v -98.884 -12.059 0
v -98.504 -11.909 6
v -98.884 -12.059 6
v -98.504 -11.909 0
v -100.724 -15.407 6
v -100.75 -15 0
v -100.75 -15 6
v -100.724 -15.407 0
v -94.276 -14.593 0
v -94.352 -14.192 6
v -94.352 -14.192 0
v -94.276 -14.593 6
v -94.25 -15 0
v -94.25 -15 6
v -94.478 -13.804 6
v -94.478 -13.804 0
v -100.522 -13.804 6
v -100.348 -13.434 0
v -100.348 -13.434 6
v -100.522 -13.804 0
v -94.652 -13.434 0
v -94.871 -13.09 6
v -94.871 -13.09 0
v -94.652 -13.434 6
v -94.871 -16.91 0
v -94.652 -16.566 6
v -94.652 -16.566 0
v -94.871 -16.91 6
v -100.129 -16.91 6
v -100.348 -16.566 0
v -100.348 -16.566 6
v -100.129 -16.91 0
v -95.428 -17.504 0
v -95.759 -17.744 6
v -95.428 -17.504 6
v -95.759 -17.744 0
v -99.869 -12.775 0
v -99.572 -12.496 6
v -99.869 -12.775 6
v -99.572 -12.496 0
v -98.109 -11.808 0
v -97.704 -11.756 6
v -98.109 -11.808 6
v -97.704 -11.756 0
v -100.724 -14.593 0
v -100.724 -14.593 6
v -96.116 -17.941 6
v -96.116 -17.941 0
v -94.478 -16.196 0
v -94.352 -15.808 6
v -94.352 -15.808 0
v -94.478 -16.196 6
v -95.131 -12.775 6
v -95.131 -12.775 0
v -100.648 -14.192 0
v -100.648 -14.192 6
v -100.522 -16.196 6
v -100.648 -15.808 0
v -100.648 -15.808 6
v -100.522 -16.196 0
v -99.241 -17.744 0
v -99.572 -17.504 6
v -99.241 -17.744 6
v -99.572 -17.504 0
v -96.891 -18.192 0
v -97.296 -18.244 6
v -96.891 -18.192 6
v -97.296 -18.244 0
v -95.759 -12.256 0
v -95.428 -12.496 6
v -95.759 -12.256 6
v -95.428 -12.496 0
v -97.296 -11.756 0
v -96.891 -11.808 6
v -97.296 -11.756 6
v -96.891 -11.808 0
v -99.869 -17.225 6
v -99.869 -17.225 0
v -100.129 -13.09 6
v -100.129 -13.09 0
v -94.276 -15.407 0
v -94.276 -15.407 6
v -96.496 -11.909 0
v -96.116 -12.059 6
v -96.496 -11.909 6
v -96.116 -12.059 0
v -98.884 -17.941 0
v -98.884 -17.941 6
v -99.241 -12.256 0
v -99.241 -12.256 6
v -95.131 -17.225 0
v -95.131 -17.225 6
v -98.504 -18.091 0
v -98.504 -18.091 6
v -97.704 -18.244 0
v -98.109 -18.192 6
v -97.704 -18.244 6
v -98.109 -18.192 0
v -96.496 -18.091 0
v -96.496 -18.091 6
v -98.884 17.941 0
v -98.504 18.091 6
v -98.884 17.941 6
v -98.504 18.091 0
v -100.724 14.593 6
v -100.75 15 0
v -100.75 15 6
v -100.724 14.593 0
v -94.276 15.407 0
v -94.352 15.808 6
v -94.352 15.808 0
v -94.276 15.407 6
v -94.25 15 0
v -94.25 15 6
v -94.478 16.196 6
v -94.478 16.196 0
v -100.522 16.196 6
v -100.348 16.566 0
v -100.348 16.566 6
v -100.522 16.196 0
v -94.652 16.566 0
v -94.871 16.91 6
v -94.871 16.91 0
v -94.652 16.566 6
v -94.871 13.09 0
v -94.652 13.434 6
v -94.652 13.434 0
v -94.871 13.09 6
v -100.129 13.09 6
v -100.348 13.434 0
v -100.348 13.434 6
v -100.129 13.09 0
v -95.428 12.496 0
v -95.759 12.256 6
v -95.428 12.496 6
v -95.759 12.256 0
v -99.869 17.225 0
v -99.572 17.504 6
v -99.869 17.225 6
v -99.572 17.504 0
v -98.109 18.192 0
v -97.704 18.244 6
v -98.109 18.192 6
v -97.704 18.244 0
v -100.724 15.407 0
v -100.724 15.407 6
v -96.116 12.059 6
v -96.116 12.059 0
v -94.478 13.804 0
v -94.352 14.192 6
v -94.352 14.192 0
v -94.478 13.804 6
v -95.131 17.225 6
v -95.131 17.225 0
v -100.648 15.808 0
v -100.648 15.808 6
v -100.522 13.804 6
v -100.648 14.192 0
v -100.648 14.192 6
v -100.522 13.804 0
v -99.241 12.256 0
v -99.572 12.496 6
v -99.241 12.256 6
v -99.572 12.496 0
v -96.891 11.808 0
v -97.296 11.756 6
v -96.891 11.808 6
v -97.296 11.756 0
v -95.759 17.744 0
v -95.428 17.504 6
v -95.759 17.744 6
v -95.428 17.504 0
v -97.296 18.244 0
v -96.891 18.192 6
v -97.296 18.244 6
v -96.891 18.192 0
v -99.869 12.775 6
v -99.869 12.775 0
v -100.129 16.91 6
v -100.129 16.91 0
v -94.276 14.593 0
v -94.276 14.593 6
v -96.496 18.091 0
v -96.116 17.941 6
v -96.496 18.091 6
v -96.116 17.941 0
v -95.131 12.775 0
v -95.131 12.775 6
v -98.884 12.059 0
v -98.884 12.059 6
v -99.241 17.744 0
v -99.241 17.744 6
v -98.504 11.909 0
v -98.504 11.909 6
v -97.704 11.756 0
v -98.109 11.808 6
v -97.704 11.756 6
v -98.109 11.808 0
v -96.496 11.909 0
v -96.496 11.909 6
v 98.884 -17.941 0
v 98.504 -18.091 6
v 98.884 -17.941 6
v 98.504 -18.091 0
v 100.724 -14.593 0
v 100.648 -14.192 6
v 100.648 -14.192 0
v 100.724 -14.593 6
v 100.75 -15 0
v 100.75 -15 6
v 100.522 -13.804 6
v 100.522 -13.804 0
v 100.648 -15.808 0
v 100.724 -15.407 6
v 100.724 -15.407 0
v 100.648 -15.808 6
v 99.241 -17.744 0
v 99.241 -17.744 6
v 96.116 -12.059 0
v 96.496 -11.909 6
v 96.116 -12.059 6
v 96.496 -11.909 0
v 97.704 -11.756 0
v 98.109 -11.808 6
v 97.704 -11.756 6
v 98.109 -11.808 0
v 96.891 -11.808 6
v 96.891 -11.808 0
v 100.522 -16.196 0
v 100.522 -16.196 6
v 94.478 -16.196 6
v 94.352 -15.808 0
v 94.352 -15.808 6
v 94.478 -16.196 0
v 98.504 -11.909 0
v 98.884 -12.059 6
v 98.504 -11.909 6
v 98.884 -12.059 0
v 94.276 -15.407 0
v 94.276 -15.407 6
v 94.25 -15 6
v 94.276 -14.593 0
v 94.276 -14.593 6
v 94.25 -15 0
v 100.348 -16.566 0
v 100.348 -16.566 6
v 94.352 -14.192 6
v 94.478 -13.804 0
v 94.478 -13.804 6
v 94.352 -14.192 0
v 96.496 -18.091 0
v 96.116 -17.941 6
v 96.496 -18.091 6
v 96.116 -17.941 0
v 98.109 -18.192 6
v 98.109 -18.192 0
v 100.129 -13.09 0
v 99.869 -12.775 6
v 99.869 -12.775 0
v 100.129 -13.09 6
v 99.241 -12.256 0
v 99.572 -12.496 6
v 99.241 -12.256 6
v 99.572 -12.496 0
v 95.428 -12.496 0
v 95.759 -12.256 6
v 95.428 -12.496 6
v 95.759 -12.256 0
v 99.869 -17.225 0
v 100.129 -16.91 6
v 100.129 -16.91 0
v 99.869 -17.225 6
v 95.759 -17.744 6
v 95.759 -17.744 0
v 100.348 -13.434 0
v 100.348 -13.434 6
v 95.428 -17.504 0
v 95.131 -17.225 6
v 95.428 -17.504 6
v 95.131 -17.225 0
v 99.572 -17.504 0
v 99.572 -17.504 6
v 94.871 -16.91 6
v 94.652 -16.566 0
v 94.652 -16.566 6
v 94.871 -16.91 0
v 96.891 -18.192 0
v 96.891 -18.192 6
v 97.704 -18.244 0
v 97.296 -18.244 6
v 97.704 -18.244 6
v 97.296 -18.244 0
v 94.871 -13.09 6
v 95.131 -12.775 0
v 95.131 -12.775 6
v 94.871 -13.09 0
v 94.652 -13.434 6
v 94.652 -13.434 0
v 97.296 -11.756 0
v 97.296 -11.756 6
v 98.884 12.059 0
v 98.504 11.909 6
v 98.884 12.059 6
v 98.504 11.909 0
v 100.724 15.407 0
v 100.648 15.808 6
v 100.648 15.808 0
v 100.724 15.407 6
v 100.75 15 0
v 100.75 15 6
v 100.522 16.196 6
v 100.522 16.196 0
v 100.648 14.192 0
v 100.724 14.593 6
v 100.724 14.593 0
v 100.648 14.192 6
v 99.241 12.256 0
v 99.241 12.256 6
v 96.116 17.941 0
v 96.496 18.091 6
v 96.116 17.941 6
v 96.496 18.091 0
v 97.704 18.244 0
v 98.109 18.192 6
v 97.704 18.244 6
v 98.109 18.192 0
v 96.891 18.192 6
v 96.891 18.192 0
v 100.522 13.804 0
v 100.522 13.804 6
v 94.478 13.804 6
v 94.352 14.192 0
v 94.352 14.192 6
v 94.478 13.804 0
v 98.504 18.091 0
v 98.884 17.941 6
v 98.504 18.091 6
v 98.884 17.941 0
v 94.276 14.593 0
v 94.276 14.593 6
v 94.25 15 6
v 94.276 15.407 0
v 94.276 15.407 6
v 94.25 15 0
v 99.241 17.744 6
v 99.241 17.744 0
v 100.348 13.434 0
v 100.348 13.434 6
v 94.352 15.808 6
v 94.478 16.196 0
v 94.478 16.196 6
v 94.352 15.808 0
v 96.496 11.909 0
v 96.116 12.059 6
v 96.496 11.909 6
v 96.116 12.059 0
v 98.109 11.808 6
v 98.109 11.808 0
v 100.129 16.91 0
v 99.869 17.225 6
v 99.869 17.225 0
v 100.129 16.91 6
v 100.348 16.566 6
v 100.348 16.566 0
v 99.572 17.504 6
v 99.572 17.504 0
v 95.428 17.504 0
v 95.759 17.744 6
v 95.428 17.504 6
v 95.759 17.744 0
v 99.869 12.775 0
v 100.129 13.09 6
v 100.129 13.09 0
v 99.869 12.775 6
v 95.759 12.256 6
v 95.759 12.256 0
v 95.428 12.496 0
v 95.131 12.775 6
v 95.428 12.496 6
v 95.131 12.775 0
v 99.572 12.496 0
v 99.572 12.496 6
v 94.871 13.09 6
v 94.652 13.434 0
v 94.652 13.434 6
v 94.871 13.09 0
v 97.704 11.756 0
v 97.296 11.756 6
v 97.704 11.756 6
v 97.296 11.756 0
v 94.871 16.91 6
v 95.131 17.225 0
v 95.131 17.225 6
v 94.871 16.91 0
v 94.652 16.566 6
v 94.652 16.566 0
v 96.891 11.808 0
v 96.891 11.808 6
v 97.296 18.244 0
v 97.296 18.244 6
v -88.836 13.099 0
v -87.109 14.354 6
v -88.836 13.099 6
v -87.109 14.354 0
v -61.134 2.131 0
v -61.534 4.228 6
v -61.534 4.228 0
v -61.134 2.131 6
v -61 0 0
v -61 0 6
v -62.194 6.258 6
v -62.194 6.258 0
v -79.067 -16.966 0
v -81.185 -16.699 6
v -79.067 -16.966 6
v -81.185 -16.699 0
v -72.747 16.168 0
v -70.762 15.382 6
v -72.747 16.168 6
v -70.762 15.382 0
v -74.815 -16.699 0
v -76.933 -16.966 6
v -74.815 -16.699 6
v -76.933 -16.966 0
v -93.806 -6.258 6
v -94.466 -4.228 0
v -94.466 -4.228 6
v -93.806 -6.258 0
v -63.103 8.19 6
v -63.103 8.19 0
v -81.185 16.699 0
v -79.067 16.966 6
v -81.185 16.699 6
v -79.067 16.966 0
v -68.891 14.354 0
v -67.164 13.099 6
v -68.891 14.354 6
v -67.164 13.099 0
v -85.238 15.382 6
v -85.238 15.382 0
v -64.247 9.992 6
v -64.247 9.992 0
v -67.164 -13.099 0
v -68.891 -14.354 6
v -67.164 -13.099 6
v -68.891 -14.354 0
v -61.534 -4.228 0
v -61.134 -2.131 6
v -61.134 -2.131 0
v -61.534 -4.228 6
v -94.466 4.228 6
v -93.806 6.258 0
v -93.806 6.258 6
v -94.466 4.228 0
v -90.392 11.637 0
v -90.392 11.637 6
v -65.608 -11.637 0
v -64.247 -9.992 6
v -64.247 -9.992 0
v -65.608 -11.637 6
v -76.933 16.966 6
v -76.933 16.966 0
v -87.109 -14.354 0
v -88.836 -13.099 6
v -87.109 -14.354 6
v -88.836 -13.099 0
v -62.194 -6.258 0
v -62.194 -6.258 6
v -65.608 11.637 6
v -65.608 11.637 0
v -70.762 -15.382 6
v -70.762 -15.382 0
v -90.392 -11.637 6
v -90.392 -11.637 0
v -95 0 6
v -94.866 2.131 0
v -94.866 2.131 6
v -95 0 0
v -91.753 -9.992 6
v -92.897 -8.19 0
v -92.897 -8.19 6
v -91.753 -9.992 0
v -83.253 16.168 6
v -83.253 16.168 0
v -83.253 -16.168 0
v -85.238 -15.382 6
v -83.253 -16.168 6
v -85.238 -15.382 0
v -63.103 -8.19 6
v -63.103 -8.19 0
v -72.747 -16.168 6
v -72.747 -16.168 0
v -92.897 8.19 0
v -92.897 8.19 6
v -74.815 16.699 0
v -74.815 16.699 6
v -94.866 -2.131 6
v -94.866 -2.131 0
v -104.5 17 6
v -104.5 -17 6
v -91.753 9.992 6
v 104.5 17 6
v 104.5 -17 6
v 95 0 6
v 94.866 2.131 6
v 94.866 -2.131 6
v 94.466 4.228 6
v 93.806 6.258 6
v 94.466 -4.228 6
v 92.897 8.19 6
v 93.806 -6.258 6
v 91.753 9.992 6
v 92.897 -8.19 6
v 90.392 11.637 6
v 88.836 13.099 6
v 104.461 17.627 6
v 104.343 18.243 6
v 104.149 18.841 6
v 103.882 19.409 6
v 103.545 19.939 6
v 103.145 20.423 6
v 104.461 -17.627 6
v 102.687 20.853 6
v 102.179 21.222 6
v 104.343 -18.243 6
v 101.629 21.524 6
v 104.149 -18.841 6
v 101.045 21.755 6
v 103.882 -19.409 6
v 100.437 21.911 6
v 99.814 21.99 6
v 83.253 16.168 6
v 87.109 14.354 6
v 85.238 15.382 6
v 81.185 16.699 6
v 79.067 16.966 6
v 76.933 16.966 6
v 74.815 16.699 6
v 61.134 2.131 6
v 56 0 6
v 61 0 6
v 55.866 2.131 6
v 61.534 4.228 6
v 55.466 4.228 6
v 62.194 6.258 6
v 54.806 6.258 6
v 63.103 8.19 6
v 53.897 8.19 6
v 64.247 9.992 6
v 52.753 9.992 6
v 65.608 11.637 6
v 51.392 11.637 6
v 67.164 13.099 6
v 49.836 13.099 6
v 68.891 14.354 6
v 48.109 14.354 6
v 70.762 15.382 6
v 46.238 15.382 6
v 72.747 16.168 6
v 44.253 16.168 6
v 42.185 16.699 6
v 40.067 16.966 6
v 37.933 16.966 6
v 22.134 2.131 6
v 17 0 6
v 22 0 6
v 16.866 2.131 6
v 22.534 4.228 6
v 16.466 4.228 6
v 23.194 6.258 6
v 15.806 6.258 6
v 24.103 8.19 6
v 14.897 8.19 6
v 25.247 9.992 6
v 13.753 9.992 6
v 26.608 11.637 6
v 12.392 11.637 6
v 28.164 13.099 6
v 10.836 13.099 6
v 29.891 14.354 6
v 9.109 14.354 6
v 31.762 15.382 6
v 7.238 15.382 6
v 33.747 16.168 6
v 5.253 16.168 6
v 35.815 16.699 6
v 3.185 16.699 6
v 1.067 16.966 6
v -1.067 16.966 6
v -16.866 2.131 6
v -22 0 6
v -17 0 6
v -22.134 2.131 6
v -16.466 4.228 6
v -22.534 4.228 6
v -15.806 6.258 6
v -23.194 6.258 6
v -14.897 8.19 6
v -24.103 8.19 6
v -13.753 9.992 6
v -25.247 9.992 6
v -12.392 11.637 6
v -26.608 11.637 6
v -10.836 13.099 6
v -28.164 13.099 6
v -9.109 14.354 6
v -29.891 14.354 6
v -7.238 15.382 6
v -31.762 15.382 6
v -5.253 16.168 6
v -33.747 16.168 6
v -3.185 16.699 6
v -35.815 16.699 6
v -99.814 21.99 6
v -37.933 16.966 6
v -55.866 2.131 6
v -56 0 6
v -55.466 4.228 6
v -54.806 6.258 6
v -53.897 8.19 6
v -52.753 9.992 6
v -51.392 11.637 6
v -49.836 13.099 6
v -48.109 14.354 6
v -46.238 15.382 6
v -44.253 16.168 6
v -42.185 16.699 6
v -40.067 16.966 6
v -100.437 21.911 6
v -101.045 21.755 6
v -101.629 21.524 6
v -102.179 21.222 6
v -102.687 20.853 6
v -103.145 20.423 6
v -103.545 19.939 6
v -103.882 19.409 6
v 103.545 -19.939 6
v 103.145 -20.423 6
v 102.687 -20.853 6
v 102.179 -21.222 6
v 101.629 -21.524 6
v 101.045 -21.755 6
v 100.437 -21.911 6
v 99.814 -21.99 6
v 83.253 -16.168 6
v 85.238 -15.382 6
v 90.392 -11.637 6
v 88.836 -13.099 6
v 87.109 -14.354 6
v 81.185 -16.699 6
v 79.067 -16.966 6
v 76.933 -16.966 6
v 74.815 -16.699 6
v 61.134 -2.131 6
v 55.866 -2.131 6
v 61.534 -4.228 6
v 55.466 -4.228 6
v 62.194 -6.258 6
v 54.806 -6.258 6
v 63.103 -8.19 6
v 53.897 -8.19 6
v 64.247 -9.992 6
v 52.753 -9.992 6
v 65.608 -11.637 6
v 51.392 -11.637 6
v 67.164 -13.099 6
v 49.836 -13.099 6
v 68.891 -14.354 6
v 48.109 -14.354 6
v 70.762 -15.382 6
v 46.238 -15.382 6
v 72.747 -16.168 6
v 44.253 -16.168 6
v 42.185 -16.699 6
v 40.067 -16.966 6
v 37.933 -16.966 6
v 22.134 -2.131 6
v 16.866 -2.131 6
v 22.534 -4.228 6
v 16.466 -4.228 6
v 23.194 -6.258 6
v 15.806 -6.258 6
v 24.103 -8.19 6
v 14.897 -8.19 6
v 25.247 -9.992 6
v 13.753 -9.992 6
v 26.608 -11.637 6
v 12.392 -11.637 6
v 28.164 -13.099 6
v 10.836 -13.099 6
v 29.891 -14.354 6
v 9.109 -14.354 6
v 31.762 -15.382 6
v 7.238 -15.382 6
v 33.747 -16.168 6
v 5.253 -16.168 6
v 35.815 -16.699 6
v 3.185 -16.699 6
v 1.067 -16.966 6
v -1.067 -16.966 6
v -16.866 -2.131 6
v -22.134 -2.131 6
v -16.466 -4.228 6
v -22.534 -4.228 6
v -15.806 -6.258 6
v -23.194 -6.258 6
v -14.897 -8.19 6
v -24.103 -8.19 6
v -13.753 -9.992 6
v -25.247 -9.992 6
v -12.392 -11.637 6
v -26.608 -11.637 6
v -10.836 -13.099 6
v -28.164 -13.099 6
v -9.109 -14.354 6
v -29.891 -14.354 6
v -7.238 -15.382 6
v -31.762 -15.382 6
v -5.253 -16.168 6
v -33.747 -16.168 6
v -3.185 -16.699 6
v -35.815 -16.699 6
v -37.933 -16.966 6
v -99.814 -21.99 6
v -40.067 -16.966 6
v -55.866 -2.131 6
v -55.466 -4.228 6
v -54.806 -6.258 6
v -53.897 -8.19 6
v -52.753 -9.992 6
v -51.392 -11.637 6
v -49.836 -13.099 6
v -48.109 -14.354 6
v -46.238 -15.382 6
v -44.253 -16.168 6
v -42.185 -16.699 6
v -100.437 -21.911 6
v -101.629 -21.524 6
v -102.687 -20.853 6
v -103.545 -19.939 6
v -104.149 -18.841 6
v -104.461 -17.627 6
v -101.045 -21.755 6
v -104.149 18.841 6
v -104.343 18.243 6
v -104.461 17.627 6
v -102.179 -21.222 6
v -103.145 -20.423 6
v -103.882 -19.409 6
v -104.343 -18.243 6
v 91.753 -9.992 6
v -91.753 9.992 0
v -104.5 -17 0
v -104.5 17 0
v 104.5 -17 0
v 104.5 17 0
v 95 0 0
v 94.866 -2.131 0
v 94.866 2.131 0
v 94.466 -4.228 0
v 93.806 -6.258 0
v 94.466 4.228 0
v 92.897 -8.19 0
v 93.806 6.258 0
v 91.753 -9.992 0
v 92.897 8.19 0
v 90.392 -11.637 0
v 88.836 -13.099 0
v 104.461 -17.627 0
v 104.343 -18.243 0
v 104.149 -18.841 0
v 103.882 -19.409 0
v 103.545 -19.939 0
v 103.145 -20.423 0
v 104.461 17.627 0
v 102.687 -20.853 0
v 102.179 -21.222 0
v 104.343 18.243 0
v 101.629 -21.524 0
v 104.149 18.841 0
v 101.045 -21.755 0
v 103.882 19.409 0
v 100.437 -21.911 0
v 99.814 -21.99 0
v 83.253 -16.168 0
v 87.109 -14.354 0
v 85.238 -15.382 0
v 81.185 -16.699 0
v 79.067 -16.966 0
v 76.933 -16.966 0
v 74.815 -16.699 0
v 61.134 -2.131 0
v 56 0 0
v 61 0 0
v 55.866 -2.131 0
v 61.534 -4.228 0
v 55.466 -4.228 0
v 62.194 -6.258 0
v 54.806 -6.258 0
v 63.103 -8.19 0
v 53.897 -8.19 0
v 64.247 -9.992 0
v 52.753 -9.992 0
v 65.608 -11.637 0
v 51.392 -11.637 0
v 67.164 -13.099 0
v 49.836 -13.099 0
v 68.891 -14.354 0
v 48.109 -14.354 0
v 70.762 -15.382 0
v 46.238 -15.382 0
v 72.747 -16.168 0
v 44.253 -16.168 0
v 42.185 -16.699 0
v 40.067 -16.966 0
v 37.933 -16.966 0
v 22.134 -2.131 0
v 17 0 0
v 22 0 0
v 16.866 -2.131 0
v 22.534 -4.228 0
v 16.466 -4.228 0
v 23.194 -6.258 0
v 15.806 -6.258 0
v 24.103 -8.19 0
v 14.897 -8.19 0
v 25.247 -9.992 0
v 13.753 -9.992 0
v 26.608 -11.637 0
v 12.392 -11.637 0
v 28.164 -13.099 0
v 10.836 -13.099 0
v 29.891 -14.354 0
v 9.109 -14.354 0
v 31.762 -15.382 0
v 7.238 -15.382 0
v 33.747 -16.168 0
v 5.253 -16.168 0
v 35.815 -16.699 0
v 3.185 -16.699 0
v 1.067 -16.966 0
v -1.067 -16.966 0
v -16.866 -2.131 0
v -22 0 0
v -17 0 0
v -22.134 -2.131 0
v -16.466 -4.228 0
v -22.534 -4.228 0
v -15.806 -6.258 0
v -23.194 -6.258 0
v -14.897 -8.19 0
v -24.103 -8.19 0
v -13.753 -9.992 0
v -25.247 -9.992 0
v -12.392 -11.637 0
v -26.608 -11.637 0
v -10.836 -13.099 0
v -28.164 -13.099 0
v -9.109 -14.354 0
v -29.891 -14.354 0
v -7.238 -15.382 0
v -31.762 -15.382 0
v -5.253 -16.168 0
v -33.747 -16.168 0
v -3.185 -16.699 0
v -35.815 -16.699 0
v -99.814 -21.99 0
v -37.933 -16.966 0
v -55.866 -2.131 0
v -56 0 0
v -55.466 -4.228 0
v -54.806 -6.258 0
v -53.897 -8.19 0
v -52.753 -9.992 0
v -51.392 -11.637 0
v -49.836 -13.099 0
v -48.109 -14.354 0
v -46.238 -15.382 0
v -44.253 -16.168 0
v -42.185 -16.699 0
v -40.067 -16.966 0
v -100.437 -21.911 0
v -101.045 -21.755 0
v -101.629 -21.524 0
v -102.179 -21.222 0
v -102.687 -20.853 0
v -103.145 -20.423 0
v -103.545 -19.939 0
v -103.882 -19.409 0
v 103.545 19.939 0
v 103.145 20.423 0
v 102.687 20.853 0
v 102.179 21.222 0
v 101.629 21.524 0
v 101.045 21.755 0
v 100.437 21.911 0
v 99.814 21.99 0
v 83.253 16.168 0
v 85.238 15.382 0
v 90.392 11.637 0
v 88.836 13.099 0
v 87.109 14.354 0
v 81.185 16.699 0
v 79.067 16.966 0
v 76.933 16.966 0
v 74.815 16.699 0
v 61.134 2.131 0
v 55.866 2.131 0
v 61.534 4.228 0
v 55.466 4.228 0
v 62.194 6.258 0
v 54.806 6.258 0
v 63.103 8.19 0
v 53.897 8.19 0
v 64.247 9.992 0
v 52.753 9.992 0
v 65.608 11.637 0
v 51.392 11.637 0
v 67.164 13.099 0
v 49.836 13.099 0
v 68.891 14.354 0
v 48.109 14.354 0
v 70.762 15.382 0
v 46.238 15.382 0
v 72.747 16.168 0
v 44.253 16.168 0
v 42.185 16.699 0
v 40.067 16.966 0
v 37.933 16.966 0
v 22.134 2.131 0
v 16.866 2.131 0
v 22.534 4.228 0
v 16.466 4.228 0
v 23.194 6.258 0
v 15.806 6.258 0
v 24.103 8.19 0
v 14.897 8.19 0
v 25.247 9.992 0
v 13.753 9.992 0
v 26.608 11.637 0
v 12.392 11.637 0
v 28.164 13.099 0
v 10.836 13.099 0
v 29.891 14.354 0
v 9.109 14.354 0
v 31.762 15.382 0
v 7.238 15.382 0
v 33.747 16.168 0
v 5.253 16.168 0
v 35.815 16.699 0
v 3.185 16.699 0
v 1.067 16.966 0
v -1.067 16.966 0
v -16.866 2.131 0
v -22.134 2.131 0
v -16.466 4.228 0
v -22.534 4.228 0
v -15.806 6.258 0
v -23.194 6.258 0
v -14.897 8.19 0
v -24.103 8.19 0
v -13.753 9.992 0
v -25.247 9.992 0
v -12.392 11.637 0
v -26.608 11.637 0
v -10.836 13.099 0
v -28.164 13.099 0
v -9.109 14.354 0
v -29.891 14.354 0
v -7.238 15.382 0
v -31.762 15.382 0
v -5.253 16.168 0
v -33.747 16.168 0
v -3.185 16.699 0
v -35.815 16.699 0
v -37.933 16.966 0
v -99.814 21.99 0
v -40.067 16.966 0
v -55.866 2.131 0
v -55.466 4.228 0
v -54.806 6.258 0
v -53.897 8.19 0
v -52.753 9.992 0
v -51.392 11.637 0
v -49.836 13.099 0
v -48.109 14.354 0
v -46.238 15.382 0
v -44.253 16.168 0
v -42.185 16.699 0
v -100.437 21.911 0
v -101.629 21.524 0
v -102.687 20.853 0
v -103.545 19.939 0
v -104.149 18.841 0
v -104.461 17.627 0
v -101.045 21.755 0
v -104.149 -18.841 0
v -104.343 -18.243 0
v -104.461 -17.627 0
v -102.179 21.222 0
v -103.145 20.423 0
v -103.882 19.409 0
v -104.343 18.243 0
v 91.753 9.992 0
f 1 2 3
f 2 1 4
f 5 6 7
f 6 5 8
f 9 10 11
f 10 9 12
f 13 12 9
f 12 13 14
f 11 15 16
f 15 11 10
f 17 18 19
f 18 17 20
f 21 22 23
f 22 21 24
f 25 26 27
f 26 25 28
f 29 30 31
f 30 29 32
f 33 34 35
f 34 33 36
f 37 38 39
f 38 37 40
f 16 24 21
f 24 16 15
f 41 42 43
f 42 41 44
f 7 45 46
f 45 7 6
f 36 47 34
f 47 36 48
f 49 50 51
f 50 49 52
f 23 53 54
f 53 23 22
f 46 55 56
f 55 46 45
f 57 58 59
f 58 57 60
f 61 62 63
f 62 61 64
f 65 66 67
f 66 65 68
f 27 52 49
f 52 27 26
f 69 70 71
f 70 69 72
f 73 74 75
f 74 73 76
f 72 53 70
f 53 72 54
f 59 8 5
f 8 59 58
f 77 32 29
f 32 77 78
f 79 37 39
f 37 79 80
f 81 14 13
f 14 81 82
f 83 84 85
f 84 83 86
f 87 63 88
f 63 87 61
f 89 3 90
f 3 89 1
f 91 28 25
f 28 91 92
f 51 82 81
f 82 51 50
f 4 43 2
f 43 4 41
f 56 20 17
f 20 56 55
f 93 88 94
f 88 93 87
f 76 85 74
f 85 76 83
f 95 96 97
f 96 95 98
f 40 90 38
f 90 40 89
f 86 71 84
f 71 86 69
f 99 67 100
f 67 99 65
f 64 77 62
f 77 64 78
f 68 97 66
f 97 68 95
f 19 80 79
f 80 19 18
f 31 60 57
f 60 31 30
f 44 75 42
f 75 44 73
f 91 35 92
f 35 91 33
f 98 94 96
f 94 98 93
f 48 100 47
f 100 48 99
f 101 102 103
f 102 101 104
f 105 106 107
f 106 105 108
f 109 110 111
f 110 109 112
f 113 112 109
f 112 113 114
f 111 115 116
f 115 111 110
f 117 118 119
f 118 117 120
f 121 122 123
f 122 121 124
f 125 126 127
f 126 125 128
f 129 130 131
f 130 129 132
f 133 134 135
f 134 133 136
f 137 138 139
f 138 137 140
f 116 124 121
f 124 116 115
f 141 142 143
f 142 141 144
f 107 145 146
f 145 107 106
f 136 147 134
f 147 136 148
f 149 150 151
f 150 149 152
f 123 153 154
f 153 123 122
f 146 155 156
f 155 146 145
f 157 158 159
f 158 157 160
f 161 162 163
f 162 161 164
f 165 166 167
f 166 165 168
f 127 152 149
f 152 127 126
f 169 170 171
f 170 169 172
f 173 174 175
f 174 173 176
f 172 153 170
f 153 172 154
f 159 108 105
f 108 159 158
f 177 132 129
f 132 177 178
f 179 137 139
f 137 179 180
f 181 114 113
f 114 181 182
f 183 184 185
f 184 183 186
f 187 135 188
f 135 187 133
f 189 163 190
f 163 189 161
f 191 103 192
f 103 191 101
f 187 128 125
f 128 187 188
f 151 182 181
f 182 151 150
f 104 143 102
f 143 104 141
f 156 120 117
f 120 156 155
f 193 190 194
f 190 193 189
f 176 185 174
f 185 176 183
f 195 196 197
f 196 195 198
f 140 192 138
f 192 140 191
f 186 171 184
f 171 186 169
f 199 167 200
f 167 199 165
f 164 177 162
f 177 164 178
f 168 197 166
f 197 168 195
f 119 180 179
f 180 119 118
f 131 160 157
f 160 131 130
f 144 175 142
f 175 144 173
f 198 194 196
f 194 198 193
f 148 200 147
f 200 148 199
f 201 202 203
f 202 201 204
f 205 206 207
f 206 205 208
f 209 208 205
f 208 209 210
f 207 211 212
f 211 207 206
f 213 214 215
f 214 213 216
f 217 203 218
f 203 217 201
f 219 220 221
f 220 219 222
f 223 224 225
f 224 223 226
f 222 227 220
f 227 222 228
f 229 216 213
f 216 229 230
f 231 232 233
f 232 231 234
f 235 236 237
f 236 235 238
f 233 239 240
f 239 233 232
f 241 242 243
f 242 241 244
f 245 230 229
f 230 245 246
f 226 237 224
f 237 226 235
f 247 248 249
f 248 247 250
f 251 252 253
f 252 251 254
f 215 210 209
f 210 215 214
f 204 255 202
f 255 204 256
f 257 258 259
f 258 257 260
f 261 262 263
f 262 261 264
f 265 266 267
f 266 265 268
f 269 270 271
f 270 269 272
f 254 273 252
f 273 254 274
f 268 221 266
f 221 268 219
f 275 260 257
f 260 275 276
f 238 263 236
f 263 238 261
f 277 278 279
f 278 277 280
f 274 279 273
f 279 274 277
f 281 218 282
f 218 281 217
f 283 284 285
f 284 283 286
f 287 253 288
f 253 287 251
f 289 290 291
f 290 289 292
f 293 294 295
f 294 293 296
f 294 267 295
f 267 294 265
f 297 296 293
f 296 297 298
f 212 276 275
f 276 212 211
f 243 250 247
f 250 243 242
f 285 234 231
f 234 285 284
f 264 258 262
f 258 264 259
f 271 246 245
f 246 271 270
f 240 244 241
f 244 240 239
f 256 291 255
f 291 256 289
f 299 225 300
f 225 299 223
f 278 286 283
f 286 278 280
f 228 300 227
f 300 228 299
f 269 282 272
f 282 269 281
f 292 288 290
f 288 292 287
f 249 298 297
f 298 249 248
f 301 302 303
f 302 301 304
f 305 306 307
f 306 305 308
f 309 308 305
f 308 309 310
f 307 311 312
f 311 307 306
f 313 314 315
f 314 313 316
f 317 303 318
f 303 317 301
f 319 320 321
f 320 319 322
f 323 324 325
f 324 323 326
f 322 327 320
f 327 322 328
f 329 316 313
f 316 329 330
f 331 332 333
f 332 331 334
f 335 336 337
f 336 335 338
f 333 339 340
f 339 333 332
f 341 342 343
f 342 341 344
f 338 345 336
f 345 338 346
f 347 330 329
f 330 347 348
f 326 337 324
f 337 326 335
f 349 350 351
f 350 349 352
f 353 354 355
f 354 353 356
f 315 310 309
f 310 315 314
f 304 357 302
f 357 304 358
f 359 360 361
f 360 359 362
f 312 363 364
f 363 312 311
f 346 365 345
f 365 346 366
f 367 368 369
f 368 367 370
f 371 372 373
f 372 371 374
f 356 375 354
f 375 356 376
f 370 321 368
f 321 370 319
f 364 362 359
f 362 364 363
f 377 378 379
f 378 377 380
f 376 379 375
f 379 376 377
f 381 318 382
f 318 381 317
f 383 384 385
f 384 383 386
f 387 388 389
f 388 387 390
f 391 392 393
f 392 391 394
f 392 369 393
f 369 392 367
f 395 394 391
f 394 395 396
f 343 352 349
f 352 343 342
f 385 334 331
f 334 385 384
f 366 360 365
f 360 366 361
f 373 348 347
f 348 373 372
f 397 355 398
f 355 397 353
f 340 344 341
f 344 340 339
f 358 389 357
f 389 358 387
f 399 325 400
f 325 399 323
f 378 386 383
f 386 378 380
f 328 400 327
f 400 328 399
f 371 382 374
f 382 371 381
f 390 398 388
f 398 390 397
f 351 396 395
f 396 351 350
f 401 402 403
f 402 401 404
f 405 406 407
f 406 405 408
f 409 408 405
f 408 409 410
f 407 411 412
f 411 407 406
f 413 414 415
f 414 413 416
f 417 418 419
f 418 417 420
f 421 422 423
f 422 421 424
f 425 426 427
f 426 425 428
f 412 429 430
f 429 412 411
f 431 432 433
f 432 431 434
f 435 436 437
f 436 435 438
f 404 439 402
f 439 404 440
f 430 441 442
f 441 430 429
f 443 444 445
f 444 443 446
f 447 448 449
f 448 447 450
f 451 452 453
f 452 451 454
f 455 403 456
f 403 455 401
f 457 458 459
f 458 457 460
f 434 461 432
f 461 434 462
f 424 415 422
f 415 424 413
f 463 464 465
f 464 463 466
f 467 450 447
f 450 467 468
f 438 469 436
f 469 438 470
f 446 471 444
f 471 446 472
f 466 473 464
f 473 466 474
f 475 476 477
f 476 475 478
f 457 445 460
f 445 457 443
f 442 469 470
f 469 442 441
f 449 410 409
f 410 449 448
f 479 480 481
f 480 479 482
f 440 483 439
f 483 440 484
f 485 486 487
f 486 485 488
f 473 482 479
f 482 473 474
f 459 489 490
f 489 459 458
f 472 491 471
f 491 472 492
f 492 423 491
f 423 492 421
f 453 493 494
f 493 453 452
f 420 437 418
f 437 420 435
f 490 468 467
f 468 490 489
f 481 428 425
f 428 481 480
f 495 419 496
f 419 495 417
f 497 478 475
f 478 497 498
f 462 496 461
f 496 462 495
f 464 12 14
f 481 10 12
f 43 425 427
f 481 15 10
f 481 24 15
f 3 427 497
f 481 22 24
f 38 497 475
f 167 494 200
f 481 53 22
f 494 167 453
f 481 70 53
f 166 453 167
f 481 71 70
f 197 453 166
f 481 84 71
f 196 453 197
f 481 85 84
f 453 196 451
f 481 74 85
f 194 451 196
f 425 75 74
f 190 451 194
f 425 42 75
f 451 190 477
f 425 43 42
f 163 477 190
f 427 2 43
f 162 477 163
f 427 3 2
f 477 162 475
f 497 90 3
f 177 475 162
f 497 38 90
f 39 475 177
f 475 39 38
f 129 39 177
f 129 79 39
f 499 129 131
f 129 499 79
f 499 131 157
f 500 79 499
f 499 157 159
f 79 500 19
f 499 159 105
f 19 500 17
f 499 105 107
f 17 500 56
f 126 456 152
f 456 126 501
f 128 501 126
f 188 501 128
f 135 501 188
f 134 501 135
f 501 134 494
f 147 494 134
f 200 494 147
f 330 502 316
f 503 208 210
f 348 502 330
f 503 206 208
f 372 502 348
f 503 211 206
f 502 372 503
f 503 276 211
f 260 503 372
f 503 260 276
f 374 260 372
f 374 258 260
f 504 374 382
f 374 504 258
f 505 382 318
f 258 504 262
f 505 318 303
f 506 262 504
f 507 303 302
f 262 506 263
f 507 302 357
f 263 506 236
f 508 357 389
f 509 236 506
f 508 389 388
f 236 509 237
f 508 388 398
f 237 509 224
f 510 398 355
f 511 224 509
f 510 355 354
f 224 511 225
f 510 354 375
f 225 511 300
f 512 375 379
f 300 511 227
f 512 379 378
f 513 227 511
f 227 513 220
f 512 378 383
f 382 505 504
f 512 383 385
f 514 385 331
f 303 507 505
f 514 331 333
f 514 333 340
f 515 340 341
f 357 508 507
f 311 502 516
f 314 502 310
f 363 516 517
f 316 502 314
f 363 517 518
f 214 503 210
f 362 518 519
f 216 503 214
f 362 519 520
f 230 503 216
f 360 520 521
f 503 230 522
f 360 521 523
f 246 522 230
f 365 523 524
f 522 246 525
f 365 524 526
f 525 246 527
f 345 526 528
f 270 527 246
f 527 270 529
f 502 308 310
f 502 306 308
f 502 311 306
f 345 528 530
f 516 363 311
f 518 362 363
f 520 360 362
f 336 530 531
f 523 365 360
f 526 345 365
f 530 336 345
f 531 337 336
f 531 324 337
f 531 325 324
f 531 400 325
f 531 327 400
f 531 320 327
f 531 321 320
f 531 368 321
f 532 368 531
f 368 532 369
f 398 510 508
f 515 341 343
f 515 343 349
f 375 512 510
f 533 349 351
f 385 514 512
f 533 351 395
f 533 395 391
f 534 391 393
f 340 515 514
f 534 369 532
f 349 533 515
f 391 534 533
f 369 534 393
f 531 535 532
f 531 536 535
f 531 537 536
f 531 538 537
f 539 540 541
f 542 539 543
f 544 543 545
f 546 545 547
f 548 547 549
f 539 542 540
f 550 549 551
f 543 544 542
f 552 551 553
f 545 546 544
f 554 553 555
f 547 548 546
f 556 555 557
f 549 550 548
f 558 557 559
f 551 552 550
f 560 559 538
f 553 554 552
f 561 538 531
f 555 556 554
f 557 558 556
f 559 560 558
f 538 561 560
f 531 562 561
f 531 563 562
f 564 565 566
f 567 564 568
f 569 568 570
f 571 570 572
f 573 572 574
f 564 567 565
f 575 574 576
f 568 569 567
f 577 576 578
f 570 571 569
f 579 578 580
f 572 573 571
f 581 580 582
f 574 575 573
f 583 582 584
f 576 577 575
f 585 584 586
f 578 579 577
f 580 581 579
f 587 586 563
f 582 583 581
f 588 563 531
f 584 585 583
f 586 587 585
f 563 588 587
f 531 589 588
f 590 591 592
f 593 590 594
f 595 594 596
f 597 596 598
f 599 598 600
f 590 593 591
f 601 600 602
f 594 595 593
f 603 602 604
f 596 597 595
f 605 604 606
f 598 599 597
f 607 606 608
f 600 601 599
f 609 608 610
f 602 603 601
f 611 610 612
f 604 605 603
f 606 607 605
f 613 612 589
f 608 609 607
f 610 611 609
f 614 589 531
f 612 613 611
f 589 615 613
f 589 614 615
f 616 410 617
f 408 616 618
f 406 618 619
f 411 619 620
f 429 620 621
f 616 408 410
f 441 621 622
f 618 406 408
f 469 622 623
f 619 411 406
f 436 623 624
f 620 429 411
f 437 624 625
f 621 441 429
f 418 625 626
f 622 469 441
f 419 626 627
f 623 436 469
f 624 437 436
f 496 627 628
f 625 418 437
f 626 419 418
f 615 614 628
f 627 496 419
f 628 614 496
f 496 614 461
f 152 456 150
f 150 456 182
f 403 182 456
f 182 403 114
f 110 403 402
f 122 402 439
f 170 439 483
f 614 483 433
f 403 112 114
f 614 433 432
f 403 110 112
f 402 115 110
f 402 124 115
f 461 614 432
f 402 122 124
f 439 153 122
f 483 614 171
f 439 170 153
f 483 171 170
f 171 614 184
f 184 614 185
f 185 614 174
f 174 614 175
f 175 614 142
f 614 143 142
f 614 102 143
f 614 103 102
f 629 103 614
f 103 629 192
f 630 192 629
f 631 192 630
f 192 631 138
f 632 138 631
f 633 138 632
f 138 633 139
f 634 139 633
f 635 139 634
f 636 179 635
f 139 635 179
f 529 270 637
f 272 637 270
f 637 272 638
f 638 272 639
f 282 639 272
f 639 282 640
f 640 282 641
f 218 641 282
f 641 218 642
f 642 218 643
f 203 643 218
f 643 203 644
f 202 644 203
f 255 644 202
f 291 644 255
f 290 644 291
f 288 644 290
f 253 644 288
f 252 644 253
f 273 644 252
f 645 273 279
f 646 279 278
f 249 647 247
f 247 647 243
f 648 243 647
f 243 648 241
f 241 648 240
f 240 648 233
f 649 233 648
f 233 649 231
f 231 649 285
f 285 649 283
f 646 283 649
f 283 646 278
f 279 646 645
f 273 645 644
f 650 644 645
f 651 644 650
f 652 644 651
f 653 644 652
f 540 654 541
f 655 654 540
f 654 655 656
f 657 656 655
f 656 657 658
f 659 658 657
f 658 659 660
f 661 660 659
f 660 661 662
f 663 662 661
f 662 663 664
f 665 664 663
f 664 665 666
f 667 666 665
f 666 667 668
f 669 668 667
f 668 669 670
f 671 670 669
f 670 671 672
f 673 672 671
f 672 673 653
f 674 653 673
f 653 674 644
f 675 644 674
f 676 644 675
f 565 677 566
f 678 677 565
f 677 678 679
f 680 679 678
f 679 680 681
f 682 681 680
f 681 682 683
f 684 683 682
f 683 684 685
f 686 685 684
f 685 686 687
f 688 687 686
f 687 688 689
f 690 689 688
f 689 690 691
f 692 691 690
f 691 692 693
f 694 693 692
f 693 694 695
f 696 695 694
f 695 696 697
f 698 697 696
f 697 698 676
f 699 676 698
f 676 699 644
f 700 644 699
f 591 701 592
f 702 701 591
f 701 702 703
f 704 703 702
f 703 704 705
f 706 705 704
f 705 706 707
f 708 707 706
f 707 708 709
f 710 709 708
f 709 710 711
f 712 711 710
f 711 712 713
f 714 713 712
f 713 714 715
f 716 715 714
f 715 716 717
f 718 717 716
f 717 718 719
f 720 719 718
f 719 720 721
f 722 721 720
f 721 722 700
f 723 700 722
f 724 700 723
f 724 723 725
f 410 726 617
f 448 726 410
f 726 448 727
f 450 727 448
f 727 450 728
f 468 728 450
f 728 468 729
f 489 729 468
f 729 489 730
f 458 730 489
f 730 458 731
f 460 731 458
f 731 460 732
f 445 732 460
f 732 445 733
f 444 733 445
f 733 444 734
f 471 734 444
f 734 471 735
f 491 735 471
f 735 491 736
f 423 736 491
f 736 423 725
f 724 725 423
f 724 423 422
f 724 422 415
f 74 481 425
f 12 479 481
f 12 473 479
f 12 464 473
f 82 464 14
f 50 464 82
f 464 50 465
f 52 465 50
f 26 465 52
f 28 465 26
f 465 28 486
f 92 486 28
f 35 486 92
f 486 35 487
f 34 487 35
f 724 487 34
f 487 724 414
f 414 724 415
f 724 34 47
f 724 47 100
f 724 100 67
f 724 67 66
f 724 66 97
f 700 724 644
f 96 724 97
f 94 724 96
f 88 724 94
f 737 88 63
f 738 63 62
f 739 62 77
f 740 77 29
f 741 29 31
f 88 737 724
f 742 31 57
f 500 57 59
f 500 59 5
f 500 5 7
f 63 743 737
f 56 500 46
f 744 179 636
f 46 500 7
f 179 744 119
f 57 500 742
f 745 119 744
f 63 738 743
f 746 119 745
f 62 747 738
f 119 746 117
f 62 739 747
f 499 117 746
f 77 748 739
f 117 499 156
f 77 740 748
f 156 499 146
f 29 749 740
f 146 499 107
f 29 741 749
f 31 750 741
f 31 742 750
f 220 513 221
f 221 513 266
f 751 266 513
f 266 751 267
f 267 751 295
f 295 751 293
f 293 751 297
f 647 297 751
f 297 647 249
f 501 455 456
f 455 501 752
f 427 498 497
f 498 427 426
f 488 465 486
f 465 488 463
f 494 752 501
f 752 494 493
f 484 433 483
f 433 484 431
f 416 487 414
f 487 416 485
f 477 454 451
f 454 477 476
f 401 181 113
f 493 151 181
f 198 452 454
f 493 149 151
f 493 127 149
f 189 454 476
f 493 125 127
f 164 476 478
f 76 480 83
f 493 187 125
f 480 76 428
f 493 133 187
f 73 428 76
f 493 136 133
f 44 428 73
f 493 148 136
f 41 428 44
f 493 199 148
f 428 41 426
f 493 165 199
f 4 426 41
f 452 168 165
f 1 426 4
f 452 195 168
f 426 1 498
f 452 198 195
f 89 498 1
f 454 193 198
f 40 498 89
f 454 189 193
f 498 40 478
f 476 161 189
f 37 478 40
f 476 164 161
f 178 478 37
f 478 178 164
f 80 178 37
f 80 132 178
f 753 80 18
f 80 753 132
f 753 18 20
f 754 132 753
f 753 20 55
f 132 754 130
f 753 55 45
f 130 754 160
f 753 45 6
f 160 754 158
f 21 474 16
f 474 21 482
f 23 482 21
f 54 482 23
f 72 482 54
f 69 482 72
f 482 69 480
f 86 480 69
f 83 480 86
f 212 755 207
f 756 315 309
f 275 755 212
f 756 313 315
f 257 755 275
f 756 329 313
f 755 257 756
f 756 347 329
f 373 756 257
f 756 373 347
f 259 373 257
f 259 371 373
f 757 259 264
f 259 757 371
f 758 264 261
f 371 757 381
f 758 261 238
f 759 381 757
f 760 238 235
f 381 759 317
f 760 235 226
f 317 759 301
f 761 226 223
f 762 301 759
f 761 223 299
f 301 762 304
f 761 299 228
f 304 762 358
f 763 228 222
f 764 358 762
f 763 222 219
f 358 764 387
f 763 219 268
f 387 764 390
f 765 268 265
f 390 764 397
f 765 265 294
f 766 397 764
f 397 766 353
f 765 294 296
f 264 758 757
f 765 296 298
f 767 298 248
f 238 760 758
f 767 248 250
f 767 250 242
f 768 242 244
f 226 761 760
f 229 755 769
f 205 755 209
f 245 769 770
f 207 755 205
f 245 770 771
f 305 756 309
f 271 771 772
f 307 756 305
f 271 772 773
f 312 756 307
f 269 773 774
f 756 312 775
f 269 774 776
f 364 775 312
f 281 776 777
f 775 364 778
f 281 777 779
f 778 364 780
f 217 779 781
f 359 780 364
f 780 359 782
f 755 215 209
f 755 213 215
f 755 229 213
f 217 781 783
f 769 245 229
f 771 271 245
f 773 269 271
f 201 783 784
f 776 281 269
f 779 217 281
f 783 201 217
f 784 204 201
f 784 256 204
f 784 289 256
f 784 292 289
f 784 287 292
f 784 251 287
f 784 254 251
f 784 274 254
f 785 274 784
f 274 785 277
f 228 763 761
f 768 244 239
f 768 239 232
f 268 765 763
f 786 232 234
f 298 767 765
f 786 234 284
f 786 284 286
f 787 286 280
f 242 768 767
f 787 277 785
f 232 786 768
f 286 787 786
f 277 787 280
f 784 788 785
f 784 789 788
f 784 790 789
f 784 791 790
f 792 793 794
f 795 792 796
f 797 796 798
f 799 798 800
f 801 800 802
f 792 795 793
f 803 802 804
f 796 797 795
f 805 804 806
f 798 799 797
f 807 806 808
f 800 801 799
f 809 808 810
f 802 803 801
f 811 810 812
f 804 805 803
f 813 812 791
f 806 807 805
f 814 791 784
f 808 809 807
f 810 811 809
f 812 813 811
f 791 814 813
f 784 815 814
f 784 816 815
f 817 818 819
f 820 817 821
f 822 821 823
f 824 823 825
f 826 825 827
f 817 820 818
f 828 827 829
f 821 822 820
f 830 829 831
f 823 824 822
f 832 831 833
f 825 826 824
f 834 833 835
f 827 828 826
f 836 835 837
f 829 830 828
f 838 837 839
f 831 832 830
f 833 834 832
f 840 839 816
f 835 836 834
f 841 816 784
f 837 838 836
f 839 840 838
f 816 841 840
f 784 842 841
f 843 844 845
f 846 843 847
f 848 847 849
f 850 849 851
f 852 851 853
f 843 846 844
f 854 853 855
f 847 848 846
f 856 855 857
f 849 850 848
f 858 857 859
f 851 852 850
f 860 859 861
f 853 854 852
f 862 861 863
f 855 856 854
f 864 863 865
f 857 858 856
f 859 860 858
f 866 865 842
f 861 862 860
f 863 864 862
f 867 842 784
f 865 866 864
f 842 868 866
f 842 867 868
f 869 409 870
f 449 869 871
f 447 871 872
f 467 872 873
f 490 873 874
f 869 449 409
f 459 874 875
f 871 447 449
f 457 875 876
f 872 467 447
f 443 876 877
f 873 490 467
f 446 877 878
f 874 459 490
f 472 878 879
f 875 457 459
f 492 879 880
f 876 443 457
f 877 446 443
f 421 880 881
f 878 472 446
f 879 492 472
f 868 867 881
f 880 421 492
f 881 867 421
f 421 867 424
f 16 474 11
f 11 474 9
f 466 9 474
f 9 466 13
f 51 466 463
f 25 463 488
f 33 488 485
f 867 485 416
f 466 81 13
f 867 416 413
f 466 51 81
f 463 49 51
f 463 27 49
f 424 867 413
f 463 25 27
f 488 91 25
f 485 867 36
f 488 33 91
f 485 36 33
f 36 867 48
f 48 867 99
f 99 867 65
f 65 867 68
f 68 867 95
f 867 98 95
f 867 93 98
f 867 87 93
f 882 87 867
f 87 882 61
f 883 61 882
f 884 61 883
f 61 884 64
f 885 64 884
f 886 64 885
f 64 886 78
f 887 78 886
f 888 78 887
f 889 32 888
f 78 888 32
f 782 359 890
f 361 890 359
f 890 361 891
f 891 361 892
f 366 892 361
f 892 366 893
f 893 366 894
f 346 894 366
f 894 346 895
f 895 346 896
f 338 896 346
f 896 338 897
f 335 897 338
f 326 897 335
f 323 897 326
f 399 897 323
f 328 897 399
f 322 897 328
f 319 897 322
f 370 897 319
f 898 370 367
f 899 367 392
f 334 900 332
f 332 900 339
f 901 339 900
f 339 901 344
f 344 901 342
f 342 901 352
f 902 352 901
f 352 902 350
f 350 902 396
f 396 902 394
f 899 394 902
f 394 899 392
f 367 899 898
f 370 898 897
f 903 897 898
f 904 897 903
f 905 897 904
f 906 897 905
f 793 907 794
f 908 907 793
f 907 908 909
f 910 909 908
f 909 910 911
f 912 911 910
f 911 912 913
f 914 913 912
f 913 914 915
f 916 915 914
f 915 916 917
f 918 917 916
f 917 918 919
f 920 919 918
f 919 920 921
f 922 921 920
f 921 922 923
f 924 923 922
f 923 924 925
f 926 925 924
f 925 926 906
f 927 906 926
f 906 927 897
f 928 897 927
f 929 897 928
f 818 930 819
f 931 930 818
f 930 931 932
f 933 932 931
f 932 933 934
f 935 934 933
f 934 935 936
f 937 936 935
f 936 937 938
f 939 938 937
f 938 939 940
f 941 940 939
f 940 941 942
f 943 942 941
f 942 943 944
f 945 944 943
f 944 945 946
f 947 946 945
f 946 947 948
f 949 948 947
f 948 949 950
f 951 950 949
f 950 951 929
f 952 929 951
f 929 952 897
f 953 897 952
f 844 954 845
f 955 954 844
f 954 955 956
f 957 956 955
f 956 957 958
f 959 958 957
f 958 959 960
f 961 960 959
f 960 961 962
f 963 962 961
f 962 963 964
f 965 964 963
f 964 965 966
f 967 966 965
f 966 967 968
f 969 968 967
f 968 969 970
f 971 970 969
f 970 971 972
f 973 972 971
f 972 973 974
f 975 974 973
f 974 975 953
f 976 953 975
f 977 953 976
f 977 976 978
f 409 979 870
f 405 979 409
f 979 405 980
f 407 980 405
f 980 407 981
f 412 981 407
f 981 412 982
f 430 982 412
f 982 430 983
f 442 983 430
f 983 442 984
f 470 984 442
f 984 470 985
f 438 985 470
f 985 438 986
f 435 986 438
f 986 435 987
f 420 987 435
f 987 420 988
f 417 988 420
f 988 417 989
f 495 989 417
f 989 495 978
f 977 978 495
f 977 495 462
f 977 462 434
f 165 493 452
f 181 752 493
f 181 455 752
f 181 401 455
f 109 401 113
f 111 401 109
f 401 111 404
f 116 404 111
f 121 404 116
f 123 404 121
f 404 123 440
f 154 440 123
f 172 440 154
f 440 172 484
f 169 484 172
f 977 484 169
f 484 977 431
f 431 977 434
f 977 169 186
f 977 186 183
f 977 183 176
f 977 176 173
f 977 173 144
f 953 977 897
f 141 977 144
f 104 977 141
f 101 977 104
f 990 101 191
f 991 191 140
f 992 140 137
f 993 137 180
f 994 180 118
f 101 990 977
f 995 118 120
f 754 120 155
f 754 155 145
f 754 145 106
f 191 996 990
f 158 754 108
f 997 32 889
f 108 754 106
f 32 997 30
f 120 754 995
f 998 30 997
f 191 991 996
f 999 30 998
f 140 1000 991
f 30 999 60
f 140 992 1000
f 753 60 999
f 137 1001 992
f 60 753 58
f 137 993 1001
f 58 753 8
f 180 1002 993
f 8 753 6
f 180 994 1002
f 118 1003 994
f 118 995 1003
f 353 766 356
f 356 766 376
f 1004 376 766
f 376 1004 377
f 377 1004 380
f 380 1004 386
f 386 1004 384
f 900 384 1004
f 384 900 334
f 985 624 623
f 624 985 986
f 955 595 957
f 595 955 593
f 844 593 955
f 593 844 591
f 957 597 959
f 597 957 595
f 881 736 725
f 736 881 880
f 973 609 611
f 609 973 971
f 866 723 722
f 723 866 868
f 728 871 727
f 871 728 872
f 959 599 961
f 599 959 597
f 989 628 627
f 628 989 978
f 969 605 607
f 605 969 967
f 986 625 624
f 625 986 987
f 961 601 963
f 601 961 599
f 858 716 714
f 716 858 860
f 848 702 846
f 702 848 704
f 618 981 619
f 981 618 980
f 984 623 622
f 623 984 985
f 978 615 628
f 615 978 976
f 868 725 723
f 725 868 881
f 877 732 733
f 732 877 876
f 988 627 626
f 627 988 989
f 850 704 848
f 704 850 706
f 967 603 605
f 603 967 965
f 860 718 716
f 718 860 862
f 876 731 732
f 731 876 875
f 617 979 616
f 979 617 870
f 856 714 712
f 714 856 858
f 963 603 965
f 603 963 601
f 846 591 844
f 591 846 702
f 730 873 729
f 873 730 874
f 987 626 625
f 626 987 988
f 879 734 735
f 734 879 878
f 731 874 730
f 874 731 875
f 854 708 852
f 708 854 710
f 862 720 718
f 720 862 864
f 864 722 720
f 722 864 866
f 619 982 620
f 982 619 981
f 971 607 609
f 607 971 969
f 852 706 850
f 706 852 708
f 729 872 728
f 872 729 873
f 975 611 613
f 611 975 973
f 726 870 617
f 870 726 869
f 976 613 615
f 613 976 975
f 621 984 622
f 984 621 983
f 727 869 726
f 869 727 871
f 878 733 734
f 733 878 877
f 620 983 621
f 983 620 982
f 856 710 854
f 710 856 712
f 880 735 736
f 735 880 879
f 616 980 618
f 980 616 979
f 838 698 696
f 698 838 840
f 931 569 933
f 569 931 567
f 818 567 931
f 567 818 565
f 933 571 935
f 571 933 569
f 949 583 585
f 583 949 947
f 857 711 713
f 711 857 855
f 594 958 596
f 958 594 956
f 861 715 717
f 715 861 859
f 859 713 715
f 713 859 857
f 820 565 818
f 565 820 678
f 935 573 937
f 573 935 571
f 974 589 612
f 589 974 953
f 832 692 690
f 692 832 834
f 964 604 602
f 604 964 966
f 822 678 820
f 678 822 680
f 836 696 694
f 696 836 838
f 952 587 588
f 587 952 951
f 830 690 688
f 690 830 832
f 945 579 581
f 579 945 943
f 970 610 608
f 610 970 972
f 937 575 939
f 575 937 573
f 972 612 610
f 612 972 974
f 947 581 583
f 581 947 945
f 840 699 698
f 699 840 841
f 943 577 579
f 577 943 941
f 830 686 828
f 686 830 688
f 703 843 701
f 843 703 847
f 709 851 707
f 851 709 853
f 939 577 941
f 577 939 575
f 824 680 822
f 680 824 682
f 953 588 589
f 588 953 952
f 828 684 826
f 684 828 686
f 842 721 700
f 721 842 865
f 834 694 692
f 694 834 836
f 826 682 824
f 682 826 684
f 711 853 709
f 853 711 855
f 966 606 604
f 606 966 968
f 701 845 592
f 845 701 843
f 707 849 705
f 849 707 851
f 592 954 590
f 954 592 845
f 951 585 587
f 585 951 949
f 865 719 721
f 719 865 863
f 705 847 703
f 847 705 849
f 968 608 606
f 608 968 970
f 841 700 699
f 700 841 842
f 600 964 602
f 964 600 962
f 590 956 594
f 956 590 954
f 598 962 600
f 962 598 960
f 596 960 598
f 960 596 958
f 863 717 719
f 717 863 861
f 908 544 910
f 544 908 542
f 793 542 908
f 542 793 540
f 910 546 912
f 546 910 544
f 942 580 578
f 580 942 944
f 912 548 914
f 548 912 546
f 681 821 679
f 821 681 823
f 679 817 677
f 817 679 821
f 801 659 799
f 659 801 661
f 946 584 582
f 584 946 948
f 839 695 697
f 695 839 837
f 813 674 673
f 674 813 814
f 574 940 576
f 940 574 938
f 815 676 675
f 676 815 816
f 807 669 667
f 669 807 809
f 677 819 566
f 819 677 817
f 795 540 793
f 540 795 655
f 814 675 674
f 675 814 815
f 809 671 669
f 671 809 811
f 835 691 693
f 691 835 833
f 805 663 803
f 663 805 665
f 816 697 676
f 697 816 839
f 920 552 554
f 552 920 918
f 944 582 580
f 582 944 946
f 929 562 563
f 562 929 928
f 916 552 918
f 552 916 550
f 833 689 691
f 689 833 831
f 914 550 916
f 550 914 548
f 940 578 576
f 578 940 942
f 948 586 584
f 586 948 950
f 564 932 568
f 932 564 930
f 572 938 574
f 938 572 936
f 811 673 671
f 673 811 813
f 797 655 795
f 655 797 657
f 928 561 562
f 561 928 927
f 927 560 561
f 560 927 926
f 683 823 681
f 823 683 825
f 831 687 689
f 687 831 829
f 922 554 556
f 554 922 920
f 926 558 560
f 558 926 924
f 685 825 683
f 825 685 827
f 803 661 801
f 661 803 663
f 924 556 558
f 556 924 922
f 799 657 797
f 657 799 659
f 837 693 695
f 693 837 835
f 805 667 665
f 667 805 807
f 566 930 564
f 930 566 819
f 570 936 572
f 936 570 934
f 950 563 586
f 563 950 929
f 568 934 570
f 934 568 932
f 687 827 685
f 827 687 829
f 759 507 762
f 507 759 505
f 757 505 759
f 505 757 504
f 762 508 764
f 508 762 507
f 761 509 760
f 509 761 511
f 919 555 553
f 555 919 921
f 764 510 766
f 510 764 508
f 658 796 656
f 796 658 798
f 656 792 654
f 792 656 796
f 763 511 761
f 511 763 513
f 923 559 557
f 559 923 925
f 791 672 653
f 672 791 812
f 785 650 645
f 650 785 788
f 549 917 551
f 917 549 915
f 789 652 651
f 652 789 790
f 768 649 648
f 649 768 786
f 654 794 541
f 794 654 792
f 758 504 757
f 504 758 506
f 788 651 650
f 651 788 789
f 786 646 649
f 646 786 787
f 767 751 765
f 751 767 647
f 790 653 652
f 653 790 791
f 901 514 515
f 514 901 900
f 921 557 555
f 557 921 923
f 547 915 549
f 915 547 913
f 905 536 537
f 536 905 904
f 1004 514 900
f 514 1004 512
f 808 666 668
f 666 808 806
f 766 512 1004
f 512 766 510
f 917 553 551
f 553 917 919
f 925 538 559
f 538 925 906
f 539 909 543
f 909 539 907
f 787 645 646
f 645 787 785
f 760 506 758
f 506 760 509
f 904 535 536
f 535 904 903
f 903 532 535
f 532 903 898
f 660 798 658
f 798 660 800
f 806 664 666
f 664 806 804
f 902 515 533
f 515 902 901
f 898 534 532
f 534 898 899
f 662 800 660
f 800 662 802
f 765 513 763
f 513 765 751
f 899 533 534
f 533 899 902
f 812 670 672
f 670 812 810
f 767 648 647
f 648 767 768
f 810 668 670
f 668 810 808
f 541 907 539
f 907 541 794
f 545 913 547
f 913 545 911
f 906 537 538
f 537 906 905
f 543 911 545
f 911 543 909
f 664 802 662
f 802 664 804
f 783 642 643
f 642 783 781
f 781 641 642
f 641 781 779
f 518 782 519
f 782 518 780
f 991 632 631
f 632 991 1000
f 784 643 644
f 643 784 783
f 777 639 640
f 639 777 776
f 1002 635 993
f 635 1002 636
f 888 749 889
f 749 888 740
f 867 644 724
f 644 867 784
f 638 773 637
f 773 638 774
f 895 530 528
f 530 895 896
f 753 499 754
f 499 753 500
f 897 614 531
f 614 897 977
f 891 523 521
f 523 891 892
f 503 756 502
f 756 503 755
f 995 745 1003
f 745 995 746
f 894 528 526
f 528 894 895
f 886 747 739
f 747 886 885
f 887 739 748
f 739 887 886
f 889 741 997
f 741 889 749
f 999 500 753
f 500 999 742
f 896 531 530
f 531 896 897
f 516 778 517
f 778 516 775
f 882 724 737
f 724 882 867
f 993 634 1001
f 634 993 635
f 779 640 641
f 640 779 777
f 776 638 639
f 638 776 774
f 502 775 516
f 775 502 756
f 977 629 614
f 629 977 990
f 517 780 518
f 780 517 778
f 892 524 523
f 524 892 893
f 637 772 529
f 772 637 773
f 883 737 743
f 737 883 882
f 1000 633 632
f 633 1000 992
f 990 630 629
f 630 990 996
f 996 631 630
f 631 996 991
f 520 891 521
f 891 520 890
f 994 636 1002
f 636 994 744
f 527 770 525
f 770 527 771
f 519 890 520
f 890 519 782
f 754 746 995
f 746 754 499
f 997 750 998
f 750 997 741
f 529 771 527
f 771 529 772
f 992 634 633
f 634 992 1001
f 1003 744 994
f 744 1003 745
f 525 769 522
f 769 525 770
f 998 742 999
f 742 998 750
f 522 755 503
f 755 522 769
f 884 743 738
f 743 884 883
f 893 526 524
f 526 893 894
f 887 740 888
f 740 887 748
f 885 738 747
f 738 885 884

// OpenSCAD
$fn = 50;

difference() {
	union() {
		hull() {
			translate(v = [-99.5, 17.0, 0]) {
				cylinder(h = 6, r = 5);
			}
			translate(v = [99.5, 17.0, 0]) {
				cylinder(h = 6, r = 5);
			}
			translate(v = [-99.5, -17.0, 0]) {
				cylinder(h = 6, r = 5);
			}
			translate(v = [99.5, -17.0, 0]) {
				cylinder(h = 6, r = 5);
			}
		}
	}
	union() {
		translate(v = [-97.5, -15.0, -100.0]) {
			cylinder(h = 200, r = 3.25);
		}
		translate(v = [-97.5, 15.0, -100.0]) {
			cylinder(h = 200, r = 3.25);
		}
		translate(v = [97.5, -15.0, -100.0]) {
			cylinder(h = 200, r = 3.25);
		}
		translate(v = [97.5, 15.0, -100.0]) {
			cylinder(h = 200, r = 3.25);
		}
		translate(v = [-97.5, -15.0, -100.0]) {
			cylinder(h = 200, r = 1.8);
		}
		translate(v = [-97.5, 15.0, -100.0]) {
			cylinder(h = 200, r = 1.8);
		}
		translate(v = [97.5, -15.0, -100.0]) {
			cylinder(h = 200, r = 1.8);
		}
		translate(v = [97.5, 15.0, -100.0]) {
			cylinder(h = 200, r = 1.8);
		}
		translate(v = [-78.0, 0, 0.0]) {
			cylinder(h = 6, r = 17.0);
		}
		translate(v = [-39.0, 0, 0.0]) {
			cylinder(h = 6, r = 17.0);
		}
		cylinder(h = 6, r = 17.0);
		translate(v = [39.0, 0, 0.0]) {
			cylinder(h = 6, r = 17.0);
		}
		translate(v = [78.0, 0, 0.0]) {
			cylinder(h = 6, r = 17.0);
		}
	}
}
